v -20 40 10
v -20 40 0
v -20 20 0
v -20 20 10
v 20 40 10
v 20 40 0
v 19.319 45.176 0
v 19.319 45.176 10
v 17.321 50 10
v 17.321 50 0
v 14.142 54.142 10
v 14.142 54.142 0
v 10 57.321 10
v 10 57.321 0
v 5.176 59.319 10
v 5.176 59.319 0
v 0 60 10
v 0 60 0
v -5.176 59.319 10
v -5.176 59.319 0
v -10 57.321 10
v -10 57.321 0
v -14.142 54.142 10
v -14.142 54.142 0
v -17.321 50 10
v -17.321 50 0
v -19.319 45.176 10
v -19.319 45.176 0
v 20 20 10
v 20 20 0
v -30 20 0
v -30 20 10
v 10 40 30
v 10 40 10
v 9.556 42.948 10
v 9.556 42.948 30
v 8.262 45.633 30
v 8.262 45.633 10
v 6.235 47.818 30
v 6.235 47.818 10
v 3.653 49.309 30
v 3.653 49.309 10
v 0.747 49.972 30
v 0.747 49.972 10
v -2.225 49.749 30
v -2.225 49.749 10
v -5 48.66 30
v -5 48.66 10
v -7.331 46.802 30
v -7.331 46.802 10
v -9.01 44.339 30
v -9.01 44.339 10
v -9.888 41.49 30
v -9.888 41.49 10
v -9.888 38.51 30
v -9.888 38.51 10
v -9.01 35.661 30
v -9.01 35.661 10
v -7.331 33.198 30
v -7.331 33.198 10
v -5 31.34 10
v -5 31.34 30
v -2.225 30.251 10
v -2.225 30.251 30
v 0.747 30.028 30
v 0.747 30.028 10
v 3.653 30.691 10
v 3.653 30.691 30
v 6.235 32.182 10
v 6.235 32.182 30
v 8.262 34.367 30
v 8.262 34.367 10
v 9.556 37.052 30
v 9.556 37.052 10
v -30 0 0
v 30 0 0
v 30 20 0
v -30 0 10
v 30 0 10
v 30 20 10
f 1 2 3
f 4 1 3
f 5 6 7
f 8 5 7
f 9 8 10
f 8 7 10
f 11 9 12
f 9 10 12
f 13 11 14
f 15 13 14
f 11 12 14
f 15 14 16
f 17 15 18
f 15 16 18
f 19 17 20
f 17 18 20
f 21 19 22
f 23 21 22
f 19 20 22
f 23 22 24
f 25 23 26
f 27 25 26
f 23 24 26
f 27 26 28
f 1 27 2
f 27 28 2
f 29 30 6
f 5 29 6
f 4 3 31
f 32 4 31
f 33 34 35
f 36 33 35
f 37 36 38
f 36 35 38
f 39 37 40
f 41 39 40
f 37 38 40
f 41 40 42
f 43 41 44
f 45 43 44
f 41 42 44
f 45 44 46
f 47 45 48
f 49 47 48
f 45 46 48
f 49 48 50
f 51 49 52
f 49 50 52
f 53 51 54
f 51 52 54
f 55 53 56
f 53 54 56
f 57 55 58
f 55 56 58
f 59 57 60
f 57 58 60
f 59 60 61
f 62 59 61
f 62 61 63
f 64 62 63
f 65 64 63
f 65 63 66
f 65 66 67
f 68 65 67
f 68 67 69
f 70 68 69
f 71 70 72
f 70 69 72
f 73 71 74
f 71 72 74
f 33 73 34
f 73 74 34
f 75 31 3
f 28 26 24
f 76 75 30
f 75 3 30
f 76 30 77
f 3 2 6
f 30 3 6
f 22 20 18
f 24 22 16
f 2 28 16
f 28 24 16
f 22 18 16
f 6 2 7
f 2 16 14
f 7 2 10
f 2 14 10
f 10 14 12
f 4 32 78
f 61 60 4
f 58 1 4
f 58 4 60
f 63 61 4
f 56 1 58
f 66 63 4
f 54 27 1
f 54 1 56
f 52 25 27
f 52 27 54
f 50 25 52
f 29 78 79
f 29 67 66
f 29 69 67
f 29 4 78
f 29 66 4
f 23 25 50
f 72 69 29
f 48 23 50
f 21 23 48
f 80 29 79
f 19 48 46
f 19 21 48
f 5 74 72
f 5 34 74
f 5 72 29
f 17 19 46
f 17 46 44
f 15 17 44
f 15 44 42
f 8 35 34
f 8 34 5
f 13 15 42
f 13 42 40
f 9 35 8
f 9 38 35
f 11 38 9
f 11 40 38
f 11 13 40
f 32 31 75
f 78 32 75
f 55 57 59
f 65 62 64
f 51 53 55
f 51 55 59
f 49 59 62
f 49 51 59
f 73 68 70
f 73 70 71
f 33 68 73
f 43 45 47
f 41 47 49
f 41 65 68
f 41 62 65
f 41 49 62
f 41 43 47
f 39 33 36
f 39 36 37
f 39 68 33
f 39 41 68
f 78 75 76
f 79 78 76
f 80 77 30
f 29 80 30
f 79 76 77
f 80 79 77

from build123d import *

# Parameters (mm, degrees)
BOSS_EXTRU_1_DEPTH = 10
ESQUISSE2_R        = 10
BOSS_EXTRU_2_DEPTH = 20


with BuildPart() as part:
    # Esquisse1 → Boss.-Extru.1 (new body)
    with BuildSketch(Plane.XY):
        with BuildLine():
            Line((-30, 0), (30, 0))
            Line((30, 0), (30, 20))
            Line((30, 20), (20, 20))
            Line((20, 20), (20, 40))
            ThreePointArc((20, 40), (0, 60), (-20, 40))
            Line((-20, 40), (-20, 20))
            Line((-20, 20), (-30, 20))
            Line((-30, 20), (-30, 0))
        make_face()
    extrude(amount=BOSS_EXTRU_1_DEPTH)

    # Esquisse2 → Boss.-Extru.2 (add)
    with BuildSketch(Plane.XY.offset(10)):
        with Locations((0, 40)):
            Circle(ESQUISSE2_R)
    extrude(amount=BOSS_EXTRU_2_DEPTH)


solid = part.part
